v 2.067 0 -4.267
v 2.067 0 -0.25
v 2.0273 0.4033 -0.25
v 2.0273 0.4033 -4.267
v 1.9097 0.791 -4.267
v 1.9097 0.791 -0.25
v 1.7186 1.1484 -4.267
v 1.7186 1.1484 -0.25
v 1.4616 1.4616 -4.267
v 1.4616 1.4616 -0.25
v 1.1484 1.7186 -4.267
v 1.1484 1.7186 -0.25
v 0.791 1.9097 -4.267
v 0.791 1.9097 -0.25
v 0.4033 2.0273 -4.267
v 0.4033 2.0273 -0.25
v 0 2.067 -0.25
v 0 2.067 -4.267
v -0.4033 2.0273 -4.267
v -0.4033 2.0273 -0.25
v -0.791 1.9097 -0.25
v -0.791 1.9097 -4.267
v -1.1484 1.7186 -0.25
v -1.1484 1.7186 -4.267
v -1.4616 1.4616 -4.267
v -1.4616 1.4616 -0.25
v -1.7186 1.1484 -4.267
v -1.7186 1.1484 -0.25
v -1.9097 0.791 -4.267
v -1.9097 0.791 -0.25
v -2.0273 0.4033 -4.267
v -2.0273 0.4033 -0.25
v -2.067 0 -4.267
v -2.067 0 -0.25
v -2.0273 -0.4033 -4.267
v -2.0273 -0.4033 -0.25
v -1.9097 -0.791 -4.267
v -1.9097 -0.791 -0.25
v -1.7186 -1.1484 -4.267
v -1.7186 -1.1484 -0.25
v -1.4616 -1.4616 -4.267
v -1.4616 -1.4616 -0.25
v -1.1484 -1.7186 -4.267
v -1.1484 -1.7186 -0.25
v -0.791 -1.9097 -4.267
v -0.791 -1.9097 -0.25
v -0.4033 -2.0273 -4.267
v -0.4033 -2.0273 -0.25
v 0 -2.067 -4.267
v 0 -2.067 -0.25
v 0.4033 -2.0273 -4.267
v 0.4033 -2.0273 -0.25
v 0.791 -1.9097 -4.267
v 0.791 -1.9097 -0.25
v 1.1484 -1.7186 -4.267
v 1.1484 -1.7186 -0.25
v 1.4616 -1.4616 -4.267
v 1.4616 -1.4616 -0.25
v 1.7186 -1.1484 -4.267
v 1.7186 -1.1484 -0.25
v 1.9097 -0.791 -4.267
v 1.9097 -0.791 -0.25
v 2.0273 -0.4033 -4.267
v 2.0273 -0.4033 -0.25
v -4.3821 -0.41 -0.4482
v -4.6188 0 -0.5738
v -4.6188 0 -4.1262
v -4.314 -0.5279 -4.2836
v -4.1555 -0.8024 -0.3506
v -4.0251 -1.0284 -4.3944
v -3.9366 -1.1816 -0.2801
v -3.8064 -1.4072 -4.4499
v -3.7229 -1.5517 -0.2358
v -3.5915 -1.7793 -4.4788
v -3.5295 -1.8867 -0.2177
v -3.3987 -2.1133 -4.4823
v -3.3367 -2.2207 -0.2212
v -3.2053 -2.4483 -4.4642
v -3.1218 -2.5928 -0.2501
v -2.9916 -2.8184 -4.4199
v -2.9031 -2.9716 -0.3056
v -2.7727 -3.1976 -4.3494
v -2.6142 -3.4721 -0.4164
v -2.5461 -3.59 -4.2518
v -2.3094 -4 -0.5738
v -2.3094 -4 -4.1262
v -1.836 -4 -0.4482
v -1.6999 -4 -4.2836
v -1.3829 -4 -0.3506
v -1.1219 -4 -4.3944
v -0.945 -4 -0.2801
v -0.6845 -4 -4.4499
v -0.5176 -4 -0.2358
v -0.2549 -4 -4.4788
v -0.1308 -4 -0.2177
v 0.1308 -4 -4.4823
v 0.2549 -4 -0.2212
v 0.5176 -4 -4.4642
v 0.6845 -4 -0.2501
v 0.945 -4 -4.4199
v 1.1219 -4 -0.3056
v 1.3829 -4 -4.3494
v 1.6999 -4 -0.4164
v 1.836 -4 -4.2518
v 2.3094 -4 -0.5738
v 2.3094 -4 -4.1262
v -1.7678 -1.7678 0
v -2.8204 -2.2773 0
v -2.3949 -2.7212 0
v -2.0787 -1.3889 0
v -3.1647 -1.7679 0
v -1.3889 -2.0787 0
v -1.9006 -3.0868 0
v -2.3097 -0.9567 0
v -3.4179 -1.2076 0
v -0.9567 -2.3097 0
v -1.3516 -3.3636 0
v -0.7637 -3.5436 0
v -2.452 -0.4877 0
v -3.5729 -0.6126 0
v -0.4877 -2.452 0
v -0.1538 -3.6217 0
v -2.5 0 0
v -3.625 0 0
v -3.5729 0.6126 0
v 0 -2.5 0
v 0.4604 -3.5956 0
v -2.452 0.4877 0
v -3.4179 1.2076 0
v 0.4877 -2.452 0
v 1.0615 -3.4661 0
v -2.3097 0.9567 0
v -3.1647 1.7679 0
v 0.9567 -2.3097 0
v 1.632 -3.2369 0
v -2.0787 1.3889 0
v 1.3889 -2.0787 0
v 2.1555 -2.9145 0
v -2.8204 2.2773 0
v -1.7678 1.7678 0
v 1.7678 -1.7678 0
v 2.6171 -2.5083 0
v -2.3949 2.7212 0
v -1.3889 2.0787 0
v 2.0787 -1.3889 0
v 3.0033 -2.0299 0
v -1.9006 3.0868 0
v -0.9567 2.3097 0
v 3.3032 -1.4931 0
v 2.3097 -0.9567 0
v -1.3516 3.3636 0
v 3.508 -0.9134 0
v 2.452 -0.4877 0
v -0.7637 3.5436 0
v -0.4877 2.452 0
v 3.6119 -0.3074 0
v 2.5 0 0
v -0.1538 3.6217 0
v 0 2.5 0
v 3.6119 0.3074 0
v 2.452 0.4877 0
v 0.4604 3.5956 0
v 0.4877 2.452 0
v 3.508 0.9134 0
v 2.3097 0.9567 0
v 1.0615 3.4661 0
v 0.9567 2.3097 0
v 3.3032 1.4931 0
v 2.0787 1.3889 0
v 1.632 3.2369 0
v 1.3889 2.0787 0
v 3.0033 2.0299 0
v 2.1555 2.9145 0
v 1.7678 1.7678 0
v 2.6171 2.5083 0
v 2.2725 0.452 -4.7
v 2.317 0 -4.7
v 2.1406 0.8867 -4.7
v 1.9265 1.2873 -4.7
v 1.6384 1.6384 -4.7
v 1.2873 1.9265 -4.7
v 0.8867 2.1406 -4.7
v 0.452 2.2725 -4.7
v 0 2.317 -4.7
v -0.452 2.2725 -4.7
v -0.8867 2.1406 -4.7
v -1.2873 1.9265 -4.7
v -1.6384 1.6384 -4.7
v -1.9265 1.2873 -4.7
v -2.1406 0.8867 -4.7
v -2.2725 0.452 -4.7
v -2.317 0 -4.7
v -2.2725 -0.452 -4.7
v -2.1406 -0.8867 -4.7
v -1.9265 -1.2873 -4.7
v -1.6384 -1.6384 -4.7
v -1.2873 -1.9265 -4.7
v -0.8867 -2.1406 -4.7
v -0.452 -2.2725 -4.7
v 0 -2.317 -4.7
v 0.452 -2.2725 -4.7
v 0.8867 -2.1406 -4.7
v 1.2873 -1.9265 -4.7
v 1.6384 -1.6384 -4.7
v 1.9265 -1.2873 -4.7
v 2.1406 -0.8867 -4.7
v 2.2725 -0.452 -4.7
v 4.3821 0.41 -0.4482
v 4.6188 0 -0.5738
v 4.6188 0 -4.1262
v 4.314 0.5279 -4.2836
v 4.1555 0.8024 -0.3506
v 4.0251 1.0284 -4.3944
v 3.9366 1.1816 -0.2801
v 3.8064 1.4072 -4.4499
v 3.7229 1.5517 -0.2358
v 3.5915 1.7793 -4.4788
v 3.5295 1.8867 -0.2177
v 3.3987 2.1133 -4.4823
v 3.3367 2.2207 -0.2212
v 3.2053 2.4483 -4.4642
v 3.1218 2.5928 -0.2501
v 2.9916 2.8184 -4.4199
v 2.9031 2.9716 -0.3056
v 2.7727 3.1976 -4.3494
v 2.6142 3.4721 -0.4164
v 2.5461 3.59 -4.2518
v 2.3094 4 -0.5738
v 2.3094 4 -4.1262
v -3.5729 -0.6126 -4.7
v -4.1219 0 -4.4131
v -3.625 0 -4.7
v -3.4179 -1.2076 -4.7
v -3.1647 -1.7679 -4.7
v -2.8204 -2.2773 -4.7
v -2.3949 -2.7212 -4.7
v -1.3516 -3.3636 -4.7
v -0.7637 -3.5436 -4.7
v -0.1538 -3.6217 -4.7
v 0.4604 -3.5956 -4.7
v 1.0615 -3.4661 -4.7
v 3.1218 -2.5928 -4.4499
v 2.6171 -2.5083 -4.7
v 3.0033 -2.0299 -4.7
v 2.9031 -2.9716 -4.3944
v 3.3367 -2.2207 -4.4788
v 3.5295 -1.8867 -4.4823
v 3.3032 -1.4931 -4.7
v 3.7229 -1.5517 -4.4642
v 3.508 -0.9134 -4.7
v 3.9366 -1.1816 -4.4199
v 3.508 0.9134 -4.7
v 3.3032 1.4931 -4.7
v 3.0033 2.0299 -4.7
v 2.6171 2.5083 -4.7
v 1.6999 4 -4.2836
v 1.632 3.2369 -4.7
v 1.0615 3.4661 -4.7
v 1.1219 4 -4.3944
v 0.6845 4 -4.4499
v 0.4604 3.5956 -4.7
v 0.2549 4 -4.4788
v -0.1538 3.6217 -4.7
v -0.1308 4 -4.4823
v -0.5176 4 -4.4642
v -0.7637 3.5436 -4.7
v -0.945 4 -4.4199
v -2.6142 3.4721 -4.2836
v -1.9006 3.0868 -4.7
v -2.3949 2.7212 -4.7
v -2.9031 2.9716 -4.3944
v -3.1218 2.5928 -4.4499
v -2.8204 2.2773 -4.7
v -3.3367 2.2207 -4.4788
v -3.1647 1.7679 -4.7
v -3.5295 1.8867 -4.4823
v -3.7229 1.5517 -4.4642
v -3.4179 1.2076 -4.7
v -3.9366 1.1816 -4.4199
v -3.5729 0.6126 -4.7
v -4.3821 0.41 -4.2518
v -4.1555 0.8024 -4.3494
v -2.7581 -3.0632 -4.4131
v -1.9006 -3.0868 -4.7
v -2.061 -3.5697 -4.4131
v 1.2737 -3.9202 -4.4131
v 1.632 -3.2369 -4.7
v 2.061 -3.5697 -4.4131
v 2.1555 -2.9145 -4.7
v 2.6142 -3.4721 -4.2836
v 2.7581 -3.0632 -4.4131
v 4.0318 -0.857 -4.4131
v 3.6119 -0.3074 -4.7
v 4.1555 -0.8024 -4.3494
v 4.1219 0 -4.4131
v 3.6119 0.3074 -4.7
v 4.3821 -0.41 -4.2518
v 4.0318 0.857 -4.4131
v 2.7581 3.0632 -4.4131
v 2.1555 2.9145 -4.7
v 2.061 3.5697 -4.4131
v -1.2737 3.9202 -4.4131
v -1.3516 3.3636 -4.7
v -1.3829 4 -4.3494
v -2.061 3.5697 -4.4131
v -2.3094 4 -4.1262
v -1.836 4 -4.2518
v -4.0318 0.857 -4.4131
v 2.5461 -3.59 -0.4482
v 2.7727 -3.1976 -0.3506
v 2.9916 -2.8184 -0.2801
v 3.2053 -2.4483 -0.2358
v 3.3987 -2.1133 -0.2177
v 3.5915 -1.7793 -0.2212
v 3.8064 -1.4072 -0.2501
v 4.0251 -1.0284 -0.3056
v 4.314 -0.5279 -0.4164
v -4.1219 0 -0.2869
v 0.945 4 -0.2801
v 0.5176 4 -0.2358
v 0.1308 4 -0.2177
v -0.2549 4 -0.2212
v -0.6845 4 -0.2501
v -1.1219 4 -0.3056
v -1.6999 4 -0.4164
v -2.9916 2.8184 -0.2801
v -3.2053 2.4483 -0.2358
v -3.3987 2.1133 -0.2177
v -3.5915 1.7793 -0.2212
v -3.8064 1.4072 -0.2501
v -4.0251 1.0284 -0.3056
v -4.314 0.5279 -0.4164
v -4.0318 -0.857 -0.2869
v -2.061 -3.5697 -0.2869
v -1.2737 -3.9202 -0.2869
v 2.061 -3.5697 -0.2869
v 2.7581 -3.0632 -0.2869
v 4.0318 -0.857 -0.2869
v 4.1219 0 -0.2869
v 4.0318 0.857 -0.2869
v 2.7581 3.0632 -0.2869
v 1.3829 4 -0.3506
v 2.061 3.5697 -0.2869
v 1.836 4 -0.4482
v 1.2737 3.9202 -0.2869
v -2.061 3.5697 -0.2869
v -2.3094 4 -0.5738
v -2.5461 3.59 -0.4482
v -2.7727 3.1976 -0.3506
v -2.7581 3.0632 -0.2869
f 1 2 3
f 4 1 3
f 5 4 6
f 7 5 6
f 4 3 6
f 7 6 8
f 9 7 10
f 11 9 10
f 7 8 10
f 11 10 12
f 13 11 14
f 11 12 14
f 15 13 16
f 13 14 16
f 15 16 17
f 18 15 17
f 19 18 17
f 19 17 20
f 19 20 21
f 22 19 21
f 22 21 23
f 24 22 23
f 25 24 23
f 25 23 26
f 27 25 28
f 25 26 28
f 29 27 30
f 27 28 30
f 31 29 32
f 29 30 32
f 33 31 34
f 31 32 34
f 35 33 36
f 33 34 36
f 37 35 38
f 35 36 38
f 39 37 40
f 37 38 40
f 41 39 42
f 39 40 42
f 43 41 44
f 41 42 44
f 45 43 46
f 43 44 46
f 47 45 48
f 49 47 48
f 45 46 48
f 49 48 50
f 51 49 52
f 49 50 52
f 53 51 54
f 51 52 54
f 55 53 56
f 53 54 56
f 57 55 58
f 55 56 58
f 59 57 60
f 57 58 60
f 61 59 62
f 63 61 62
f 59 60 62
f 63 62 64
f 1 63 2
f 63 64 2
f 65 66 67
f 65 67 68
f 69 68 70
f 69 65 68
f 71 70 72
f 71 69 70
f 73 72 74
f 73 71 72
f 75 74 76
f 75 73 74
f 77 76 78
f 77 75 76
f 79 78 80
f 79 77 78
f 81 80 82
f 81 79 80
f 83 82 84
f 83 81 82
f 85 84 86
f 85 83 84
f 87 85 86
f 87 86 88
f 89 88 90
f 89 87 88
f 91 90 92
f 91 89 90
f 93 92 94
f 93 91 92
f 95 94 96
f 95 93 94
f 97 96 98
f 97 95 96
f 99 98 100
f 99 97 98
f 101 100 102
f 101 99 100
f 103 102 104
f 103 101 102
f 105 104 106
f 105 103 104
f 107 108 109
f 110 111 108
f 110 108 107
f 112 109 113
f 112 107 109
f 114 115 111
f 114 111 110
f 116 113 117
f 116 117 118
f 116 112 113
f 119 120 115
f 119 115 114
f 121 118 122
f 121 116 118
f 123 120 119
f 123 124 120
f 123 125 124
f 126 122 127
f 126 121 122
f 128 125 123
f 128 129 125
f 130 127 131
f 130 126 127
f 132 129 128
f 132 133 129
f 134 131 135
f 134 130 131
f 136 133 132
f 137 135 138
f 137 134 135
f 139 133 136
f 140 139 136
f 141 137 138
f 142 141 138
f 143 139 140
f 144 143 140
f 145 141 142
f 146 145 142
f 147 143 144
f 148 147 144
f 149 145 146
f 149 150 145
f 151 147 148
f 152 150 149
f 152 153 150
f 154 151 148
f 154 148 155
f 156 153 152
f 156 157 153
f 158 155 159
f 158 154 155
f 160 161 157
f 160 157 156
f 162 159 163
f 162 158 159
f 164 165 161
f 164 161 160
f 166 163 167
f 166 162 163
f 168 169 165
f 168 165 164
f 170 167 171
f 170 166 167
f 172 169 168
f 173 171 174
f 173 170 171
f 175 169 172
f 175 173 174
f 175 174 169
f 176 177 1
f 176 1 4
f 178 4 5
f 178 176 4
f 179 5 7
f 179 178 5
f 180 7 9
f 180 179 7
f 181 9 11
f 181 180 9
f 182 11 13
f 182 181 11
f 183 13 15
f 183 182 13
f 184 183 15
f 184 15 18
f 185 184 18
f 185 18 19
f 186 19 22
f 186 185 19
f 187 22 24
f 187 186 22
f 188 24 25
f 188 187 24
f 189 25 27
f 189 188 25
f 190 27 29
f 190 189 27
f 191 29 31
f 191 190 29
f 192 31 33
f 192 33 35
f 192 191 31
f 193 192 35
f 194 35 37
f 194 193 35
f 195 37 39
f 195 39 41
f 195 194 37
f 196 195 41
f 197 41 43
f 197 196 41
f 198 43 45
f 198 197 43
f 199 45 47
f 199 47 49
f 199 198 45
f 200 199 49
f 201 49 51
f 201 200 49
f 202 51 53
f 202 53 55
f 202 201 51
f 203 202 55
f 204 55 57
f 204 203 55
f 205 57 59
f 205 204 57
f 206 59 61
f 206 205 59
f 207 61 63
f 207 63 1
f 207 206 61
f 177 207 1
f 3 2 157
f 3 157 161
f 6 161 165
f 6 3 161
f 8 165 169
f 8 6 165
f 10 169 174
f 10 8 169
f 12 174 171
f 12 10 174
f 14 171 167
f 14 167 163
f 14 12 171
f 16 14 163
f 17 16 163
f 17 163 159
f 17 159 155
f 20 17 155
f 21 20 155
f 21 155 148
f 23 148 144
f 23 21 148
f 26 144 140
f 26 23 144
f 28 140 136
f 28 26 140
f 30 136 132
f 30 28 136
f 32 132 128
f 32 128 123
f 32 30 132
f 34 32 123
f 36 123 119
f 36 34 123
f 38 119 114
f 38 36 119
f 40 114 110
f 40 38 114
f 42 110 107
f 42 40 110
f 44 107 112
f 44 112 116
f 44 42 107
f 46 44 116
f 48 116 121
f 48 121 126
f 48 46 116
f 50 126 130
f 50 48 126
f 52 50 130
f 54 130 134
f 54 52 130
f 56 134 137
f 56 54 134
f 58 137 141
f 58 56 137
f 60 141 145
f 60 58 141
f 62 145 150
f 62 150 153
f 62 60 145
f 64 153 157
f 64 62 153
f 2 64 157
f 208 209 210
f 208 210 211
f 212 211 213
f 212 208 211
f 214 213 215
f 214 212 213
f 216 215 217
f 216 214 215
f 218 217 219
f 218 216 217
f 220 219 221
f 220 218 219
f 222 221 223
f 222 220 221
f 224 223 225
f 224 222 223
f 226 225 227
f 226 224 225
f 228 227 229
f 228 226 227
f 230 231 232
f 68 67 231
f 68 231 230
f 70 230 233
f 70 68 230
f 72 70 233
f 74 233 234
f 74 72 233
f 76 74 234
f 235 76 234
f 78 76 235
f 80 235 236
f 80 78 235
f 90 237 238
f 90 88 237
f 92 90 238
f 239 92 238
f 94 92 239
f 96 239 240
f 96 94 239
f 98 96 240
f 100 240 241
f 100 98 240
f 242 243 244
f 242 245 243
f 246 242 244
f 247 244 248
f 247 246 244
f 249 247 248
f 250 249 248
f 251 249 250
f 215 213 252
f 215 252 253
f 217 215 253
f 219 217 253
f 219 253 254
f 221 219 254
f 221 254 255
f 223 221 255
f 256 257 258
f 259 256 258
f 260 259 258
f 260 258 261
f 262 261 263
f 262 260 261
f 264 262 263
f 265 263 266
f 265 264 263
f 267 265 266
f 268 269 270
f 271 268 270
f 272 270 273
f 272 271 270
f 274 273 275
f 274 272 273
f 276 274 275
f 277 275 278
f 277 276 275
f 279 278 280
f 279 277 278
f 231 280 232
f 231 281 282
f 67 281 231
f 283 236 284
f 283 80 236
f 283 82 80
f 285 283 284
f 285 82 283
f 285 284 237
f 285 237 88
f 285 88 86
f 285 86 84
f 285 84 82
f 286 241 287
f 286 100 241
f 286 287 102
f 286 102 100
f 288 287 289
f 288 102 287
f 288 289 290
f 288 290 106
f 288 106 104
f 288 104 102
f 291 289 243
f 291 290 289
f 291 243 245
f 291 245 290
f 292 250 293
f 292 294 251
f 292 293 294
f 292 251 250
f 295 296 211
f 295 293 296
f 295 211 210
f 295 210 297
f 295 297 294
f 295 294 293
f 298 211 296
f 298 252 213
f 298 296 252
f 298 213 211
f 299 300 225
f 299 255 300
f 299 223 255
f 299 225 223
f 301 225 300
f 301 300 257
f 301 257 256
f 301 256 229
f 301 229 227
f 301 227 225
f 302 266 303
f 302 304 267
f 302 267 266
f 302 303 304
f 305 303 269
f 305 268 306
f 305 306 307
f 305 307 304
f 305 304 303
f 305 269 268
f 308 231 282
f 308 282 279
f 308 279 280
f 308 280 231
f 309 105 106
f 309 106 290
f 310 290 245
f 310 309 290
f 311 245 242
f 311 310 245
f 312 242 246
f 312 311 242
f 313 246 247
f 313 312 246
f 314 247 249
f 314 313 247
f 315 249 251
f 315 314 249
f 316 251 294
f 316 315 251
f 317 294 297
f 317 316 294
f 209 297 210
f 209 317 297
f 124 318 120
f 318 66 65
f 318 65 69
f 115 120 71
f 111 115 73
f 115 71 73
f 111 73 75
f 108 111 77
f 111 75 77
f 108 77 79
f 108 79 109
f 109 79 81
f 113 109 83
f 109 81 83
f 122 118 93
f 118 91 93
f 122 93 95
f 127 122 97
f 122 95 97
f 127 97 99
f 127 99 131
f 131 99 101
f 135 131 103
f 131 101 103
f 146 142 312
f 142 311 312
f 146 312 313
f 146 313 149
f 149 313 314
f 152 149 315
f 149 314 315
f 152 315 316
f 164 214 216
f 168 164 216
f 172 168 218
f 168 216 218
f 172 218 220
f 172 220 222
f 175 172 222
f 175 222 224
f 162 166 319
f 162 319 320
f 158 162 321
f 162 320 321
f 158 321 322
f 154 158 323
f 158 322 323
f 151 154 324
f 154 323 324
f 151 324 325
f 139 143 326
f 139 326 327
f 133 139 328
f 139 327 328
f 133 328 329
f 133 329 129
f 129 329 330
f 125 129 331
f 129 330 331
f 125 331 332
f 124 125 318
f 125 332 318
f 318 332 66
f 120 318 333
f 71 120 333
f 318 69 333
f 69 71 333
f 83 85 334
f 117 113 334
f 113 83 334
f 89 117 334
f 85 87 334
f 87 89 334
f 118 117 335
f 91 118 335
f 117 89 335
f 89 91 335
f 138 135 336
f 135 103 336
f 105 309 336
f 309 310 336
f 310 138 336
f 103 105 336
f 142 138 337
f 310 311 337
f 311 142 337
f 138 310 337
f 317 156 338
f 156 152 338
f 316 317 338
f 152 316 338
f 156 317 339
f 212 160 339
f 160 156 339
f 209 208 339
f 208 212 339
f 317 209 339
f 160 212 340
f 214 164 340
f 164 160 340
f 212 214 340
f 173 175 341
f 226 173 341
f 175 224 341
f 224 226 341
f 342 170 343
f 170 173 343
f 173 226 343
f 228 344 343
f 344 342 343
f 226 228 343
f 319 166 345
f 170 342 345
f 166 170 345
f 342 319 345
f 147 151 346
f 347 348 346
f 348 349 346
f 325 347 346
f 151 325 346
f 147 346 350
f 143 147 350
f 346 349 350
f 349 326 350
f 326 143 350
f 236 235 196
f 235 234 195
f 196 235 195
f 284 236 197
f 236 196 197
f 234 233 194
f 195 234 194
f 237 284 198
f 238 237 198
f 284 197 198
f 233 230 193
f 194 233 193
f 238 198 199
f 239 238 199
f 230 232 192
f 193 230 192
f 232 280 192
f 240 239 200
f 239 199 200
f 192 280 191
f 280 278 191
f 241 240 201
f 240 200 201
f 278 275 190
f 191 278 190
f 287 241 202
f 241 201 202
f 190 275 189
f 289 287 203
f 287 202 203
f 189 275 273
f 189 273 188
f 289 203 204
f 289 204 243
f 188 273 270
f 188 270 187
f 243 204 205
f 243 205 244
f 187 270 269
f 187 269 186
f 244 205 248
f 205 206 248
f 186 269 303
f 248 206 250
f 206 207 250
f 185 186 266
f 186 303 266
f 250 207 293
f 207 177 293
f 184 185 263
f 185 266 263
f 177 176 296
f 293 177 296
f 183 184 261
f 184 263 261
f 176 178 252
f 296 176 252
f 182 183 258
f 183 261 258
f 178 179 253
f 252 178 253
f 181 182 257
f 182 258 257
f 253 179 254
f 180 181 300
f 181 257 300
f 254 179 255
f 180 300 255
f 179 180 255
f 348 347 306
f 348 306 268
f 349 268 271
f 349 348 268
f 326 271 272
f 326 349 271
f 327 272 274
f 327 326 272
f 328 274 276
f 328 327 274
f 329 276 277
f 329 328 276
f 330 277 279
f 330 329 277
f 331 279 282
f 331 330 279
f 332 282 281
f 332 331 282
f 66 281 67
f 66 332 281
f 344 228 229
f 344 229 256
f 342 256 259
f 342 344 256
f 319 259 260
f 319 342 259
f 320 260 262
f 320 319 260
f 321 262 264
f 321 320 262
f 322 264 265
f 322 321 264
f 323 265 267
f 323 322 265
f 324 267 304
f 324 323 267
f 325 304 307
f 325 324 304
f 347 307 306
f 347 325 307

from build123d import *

# Parameters (mm, degrees)
SKETCH1_R               = 2.067
BASENUT_DEPTH           = 4.7
ENDCHAMFER_SIZE         = 0.433
ENDCHAMFER_SIZE2        = 0.249992667
ENDCHAMFER_PART_2_SIZE  = 0.433
ENDCHAMFER_PART_2_SIZE2 = 0.249992667


with BuildPart() as part:
    # Sketch1 → BaseNut (new body)
    with BuildSketch(Plane.XY):
        Polygon((4.618802154, 0), (2.309401077, 4), (-2.309401077, 4), (-4.618802154, 0), (-2.309401077, -4), (2.309401077, -4), align=None)
        Circle(SKETCH1_R, mode=Mode.SUBTRACT)
    extrude(amount=-BASENUT_DEPTH)

    # Sketch2 → Double-Chamfer (revolve, cut)
    with BuildSketch(Plane(origin=(0, 0, 0), x_dir=(1, 0, 0), z_dir=(0, 1, 0))):
        Polygon((-4.618802154, 4.7), (-3.625, 4.7), (-4.618802154, 4.126228059), align=None)
        Polygon((-4.618802154, 0.573771941), (-4.618802154, 0), (-3.625, 0), align=None)
    revolve(axis=Axis((0, 0, -3.375940562), (0, 0, 1)), mode=Mode.SUBTRACT)

    # EndChamfer
    endchamfer_edges = [part.edges().sort_by_distance(p)[0] for p in [
        (-2.067, 0, -4.7),
    ]]
    endchamfer_side = [part.faces().sort_by_distance(p)[0] for p in [
        (-2.067, 0, -2.35),
    ]]
    chamfer(endchamfer_edges, length=ENDCHAMFER_SIZE, length2=ENDCHAMFER_SIZE2, reference=endchamfer_side[0])

    # EndChamfer part 2
    endchamfer_part_2_edges = [part.edges().sort_by_distance(p)[0] for p in [
        (-2.067, 0, 0),
    ]]
    endchamfer_part_2_side = [part.faces().sort_by_distance(p)[0] for p in [
        (3.522469517, 0, 0),
    ]]
    chamfer(endchamfer_part_2_edges, length=ENDCHAMFER_PART_2_SIZE, length2=ENDCHAMFER_PART_2_SIZE2, reference=endchamfer_part_2_side[0])


solid = part.part
